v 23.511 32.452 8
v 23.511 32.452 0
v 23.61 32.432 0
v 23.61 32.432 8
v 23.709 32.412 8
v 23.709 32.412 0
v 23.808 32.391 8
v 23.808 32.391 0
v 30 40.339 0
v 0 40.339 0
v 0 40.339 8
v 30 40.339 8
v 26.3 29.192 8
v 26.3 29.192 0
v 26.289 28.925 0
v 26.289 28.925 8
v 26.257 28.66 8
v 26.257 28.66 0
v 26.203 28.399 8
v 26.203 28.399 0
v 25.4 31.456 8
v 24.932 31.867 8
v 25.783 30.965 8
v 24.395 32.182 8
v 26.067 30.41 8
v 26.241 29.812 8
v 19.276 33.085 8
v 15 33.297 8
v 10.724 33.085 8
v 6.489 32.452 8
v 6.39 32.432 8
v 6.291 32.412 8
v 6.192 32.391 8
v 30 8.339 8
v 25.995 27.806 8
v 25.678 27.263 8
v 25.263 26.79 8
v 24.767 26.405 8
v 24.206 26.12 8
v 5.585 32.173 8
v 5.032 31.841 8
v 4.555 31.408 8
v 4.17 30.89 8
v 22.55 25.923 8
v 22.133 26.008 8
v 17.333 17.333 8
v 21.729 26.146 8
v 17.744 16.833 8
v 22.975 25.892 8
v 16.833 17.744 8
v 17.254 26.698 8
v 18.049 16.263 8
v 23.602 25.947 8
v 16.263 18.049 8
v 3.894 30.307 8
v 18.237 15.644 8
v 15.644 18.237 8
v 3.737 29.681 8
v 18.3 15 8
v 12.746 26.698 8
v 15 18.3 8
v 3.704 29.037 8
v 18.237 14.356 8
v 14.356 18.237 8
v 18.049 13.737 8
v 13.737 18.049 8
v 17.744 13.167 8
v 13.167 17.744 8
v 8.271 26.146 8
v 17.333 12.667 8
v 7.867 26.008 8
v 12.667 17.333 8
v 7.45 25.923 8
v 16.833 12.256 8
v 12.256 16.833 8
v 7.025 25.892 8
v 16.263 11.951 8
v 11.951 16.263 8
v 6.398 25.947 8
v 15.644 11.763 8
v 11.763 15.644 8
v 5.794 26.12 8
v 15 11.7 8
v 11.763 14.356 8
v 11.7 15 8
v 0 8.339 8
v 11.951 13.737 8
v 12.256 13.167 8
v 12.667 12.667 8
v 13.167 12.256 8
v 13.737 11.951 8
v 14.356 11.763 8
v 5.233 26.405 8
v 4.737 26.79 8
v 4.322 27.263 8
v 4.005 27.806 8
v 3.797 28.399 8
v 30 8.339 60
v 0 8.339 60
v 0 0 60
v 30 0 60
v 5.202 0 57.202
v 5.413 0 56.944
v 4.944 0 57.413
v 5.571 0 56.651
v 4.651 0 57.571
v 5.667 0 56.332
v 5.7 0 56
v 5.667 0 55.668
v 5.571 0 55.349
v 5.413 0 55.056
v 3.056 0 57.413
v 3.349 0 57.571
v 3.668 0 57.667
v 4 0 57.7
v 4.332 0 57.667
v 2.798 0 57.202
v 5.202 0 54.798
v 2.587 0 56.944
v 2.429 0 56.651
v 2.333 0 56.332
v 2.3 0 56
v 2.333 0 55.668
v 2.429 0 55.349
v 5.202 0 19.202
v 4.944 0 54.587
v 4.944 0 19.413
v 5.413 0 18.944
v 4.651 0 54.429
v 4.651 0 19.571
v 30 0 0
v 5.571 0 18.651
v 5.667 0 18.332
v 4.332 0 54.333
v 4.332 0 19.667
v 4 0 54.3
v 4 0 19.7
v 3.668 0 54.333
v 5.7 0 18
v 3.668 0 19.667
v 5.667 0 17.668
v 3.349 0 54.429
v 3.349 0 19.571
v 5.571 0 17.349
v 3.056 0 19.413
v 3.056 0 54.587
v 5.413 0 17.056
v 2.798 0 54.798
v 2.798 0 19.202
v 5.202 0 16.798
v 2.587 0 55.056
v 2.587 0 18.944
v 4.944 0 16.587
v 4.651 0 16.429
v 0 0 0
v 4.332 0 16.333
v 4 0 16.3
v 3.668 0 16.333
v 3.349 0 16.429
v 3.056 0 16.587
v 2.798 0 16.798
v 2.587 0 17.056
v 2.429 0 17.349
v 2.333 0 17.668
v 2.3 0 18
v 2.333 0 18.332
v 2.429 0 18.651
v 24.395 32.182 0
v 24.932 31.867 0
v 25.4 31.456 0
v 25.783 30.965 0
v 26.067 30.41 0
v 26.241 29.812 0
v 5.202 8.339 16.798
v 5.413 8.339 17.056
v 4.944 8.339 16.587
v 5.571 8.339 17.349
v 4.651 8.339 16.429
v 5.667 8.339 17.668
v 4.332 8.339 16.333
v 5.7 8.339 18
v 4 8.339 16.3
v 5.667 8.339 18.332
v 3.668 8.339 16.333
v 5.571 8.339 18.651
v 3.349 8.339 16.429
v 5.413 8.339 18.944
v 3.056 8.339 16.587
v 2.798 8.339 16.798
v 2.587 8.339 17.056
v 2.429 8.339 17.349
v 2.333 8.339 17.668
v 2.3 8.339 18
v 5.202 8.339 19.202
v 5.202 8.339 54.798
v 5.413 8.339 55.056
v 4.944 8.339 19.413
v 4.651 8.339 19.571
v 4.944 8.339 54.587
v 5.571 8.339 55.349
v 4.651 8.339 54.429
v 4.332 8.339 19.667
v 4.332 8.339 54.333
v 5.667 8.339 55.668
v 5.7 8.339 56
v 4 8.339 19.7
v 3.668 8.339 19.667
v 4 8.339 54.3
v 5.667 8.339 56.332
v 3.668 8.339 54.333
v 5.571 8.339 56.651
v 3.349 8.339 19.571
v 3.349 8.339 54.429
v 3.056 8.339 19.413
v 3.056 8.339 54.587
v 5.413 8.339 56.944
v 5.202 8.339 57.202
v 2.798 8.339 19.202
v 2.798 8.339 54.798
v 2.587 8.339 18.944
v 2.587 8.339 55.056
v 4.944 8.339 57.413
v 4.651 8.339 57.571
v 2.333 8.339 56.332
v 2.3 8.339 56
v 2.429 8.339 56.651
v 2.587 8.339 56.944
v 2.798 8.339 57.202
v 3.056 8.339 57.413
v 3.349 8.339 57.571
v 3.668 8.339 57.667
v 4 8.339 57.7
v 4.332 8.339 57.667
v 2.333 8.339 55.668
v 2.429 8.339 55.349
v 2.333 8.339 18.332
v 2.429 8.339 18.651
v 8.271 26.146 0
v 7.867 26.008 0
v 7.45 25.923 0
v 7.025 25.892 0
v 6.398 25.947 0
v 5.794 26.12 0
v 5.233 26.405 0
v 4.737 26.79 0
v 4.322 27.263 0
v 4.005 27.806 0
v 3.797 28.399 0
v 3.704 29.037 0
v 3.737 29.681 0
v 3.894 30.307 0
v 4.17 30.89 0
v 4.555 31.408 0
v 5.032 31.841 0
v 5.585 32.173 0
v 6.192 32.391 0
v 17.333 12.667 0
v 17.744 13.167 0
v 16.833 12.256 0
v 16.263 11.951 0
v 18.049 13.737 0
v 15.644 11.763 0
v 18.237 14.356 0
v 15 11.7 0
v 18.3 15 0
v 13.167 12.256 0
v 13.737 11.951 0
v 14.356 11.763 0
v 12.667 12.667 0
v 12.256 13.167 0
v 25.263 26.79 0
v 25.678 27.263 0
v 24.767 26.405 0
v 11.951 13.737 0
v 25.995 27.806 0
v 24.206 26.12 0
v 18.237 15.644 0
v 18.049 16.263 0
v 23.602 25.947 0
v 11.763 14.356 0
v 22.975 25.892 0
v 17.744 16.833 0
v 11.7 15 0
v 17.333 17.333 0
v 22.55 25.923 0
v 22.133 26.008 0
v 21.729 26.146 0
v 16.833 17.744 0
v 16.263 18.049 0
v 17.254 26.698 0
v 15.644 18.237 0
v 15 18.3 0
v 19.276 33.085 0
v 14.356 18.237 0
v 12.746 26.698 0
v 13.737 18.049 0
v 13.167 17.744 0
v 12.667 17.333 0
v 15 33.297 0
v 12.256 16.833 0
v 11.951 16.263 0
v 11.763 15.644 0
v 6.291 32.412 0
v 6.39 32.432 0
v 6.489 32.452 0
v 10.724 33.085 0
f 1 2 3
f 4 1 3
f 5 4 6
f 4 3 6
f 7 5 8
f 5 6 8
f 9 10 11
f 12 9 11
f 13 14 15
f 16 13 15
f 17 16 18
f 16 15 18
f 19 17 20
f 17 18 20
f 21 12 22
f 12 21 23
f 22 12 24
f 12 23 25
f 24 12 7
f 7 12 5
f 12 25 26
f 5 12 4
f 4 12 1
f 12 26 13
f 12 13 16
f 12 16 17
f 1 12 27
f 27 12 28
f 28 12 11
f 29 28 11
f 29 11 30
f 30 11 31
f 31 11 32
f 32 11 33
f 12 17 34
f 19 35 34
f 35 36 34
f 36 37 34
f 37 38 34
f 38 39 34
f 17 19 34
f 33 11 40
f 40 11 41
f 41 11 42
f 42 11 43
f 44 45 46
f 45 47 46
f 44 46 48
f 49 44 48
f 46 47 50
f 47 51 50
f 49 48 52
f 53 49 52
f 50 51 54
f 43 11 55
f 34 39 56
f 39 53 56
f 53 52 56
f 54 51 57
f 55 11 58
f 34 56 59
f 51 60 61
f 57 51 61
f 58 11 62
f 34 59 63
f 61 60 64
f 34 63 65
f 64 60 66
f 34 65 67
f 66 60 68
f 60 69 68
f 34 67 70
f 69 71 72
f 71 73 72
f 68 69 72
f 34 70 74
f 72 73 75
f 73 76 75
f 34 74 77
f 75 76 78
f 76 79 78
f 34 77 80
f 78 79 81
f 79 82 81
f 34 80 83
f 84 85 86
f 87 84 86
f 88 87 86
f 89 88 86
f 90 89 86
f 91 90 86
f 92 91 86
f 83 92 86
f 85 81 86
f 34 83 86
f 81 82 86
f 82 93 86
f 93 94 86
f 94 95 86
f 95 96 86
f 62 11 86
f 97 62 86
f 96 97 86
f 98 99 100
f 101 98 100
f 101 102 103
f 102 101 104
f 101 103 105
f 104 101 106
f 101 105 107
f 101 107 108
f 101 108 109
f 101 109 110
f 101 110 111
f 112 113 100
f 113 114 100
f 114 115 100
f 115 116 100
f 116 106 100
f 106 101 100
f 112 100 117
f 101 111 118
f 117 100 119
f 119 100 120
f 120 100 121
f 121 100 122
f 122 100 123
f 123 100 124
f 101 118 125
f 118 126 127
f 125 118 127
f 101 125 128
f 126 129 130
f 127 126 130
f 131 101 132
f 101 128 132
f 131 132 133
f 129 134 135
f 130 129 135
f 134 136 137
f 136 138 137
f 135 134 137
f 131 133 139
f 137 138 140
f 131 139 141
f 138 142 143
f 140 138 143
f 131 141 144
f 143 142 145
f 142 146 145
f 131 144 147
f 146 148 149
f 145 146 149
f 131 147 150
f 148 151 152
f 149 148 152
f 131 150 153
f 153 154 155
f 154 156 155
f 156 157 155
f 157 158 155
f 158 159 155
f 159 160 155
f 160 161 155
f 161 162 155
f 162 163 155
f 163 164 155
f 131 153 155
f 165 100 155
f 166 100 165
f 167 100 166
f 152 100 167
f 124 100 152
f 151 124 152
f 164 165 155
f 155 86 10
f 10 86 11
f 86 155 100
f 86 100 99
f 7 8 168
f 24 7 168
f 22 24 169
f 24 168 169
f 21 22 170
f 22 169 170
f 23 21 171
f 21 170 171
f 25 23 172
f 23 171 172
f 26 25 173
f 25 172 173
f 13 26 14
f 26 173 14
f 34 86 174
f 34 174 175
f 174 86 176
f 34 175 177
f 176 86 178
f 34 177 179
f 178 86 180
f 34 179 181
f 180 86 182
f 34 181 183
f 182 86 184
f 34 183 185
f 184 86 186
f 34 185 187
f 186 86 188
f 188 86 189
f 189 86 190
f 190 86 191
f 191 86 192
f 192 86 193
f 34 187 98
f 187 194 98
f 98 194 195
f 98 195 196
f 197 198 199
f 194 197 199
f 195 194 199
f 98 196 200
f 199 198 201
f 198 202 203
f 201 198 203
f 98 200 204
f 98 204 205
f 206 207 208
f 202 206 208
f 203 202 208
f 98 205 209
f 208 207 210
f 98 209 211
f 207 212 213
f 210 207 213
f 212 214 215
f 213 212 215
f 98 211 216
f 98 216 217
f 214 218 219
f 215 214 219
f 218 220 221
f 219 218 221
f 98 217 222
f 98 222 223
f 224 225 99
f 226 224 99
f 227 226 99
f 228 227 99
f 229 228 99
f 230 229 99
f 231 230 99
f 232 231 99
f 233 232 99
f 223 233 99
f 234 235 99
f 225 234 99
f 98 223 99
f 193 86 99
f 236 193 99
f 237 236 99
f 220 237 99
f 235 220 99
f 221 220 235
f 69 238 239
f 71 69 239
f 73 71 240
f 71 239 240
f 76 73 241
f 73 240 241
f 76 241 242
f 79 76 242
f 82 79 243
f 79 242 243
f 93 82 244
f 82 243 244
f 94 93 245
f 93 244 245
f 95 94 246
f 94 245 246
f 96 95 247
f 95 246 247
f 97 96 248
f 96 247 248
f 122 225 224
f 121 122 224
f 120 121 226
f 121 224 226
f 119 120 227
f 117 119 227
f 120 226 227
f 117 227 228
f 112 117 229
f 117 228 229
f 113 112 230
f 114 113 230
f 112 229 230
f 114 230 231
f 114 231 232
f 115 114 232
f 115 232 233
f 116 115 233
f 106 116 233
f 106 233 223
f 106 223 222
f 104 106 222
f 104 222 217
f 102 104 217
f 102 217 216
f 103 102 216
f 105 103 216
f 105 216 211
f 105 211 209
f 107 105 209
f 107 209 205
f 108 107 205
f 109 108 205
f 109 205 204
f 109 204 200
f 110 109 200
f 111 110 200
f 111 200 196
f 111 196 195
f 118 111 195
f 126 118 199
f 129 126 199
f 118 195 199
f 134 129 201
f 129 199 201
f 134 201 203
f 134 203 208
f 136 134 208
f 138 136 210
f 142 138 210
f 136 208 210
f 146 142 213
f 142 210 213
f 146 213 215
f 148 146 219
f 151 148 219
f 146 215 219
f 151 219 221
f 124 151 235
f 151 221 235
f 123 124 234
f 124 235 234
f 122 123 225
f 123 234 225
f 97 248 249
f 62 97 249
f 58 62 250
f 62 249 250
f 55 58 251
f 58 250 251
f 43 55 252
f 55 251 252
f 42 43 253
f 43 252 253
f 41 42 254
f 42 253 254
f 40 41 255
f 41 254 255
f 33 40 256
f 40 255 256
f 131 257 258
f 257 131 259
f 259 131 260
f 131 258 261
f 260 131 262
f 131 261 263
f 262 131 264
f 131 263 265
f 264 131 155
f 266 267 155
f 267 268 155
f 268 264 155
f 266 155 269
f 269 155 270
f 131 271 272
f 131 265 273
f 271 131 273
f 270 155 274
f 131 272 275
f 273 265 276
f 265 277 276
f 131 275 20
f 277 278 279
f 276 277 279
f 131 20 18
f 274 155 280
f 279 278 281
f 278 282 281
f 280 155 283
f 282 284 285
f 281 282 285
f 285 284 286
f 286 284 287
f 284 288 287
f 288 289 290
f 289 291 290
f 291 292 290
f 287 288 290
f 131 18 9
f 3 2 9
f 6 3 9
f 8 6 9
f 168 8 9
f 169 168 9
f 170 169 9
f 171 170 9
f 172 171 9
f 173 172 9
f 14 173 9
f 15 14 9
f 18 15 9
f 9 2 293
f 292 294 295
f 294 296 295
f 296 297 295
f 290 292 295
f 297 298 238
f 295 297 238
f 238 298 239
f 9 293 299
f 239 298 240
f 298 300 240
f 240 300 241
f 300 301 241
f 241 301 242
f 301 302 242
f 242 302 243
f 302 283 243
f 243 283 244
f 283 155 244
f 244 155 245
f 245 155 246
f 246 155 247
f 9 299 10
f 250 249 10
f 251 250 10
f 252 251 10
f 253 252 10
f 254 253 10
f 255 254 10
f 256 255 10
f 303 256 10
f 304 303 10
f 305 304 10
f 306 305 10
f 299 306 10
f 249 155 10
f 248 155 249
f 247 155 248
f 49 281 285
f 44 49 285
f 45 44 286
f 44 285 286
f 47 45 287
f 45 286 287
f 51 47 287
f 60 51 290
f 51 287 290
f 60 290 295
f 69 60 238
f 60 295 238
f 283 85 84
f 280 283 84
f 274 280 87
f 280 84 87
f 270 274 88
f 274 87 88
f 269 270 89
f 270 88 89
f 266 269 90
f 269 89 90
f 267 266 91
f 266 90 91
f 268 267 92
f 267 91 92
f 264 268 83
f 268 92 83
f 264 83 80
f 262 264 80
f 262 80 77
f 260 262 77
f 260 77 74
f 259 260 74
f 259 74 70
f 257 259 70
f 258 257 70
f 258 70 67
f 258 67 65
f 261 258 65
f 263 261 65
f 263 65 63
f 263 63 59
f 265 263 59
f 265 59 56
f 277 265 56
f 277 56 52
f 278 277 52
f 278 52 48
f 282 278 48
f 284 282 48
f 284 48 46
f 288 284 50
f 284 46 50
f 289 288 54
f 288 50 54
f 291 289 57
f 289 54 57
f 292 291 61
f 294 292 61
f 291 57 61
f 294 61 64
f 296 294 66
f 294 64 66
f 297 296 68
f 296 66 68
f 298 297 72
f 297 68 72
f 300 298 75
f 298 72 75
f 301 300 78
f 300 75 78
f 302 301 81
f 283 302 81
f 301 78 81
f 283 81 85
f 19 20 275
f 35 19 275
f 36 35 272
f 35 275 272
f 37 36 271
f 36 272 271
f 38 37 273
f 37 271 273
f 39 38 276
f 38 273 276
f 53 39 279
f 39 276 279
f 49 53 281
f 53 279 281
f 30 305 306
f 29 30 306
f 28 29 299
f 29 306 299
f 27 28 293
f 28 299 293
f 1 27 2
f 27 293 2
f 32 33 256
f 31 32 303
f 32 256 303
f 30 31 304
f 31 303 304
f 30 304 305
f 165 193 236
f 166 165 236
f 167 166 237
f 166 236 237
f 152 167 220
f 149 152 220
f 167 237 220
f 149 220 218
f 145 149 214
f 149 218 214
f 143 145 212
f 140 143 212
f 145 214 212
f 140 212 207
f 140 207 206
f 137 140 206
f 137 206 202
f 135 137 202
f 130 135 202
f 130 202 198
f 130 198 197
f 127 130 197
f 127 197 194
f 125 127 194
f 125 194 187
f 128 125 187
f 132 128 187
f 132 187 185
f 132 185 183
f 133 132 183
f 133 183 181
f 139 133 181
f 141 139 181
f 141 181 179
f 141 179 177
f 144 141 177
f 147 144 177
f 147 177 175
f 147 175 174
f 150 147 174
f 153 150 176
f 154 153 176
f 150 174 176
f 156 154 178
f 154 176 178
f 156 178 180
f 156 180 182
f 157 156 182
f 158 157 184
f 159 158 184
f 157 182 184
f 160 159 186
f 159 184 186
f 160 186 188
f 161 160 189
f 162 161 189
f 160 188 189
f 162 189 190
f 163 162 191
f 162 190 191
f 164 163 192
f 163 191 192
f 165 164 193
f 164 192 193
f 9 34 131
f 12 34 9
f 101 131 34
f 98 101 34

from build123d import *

# Parameters (mm, degrees)
F1_DEPTH = 30
F3_D     = 3.4
F5_DEPTH = 25
F6_D     = 6.6


# Not quite as in the source:
# - a feature names something its author has since deleted; it is built from what else it names


with BuildPart() as f1:
    # F0 (on Right) → F1 (new body)
    with BuildSketch(Plane.YZ):
        Polygon((0, 60), (0, 0), (40.3389412612, 0), (40.3389412612, 8), (8.3389412612, 8), (8.3389412612, 60), align=None)
    extrude(amount=F1_DEPTH)

    # F3 (through all)
    with Locations(Plane.XZ):
        with Locations((4, 56), (4, 18)):
            Hole(F3_D / 2)

    # F4 (on face) → F5 (cut)
    with BuildSketch(Plane(origin=(0, 0, 0), x_dir=(1, 0, 0), z_dir=(0, 0, -1))):
        with BuildLine():
            ThreePointArc((8.2706560702, -26.1462763052), (7.66, -25.9585094241), (7.0246071276, -25.8919276299))
            ThreePointArc((7.0246071276, -25.8919276299), (7.6465318102, -26.0244898096), (8.2706560702, -26.1462763052))
        make_face()
        with BuildLine():
            ThreePointArc((22.9753928724, -25.8919276299), (22.34, -25.9585094241), (21.7293439298, -26.1462763052))
            ThreePointArc((21.7293439298, -26.1462763052), (22.3534681898, -26.0244898096), (22.9753928724, -25.8919276299))
        make_face()
        with BuildLine():
            ThreePointArc((19.7422005642, -29.7178994133), (15, -30), (10.2577994358, -29.7178994133))
            ThreePointArc((10.2577994358, -29.7178994133), (8.9379952514, -31.8628234183), (6.4894588415, -32.4521039296))
            ThreePointArc((6.4894588415, -32.4521039296), (15, -33.2967716909), (23.5105411585, -32.4521039296))
            ThreePointArc((23.5105411585, -32.4521039296), (21.0620047486, -31.8628234183), (19.7422005642, -29.7178994133))
        make_face()
        with BuildLine():
            ThreePointArc((10.3, -29.1918358845), (10.2894329403, -29.455712619), (10.2577994358, -29.7178994133))
            ThreePointArc((10.2577994358, -29.7178994133), (15, -30), (19.7422005642, -29.7178994133))
            ThreePointArc((19.7422005642, -29.7178994133), (20.1162784073, -27.5874201728), (21.7293439298, -26.1462763052))
            ThreePointArc((21.7293439298, -26.1462763052), (15, -26.767340949), (8.2706560702, -26.1462763052))
            ThreePointArc((8.2706560702, -26.1462763052), (9.7461941876, -27.3619677242), (10.3, -29.1918358845))
        make_face()
        with BuildLine():
            ThreePointArc((7.0246071276, -25.8919276299), (4.9757761074, -26.5855899958), (3.7966505642, -28.3990229227))
            ThreePointArc((3.7966505642, -28.3990229227), (7, -29.1918358845), (10.2577994358, -29.7178994133))
            ThreePointArc((10.2577994358, -29.7178994133), (10.2894329403, -29.455712619), (10.3, -29.1918358845))
            ThreePointArc((10.3, -29.1918358845), (9.7461941876, -27.3619677242), (8.2706560702, -26.1462763052))
            ThreePointArc((8.2706560702, -26.1462763052), (7.6465318102, -26.0244898096), (7.0246071276, -25.8919276299))
        make_face()
        with BuildLine():
            ThreePointArc((10.2577994358, -29.7178994133), (7, -29.1918358845), (3.7966505642, -28.3990229227))
            ThreePointArc((3.7966505642, -28.3990229227), (4.170235318, -30.8896084972), (6.1919389643, -32.3913729389))
            ThreePointArc((6.1919389643, -32.3913729389), (6.3406456618, -32.421999261), (6.4894588415, -32.4521039296))
            ThreePointArc((6.4894588415, -32.4521039296), (8.9379952514, -31.8628234183), (10.2577994358, -29.7178994133))
        make_face()
        with BuildLine():
            ThreePointArc((26.2033494358, -28.3990229227), (23, -29.1918358845), (19.7422005642, -29.7178994133))
            ThreePointArc((19.7422005642, -29.7178994133), (21.0620047486, -31.8628234183), (23.5105411585, -32.4521039296))
            ThreePointArc((23.5105411585, -32.4521039296), (23.6593543382, -32.421999261), (23.8080610357, -32.3913729389))
            ThreePointArc((23.8080610357, -32.3913729389), (25.6035169884, -31.2195684337), (26.3, -29.1918358845))
            ThreePointArc((26.3, -29.1918358845), (26.2757482457, -28.7924946382), (26.2033494358, -28.3990229227))
        make_face()
        with BuildLine():
            ThreePointArc((21.7293439298, -26.1462763052), (20.1162784073, -27.5874201728), (19.7422005642, -29.7178994133))
            ThreePointArc((19.7422005642, -29.7178994133), (23, -29.1918358845), (26.2033494358, -28.3990229227))
            ThreePointArc((26.2033494358, -28.3990229227), (25.0242238926, -26.5855899958), (22.9753928724, -25.8919276299))
            ThreePointArc((22.9753928724, -25.8919276299), (22.3534681898, -26.0244898096), (21.7293439298, -26.1462763052))
        make_face()
    extrude(amount=-F5_DEPTH, mode=Mode.SUBTRACT)

    # F6 (through all)
    with Locations(Plane(origin=(0, 0, 0), x_dir=(1, 0, 0), z_dir=(0, 0, -1))):
        with Locations((15, -15)):
            Hole(F6_D / 2)


solid = f1.part
